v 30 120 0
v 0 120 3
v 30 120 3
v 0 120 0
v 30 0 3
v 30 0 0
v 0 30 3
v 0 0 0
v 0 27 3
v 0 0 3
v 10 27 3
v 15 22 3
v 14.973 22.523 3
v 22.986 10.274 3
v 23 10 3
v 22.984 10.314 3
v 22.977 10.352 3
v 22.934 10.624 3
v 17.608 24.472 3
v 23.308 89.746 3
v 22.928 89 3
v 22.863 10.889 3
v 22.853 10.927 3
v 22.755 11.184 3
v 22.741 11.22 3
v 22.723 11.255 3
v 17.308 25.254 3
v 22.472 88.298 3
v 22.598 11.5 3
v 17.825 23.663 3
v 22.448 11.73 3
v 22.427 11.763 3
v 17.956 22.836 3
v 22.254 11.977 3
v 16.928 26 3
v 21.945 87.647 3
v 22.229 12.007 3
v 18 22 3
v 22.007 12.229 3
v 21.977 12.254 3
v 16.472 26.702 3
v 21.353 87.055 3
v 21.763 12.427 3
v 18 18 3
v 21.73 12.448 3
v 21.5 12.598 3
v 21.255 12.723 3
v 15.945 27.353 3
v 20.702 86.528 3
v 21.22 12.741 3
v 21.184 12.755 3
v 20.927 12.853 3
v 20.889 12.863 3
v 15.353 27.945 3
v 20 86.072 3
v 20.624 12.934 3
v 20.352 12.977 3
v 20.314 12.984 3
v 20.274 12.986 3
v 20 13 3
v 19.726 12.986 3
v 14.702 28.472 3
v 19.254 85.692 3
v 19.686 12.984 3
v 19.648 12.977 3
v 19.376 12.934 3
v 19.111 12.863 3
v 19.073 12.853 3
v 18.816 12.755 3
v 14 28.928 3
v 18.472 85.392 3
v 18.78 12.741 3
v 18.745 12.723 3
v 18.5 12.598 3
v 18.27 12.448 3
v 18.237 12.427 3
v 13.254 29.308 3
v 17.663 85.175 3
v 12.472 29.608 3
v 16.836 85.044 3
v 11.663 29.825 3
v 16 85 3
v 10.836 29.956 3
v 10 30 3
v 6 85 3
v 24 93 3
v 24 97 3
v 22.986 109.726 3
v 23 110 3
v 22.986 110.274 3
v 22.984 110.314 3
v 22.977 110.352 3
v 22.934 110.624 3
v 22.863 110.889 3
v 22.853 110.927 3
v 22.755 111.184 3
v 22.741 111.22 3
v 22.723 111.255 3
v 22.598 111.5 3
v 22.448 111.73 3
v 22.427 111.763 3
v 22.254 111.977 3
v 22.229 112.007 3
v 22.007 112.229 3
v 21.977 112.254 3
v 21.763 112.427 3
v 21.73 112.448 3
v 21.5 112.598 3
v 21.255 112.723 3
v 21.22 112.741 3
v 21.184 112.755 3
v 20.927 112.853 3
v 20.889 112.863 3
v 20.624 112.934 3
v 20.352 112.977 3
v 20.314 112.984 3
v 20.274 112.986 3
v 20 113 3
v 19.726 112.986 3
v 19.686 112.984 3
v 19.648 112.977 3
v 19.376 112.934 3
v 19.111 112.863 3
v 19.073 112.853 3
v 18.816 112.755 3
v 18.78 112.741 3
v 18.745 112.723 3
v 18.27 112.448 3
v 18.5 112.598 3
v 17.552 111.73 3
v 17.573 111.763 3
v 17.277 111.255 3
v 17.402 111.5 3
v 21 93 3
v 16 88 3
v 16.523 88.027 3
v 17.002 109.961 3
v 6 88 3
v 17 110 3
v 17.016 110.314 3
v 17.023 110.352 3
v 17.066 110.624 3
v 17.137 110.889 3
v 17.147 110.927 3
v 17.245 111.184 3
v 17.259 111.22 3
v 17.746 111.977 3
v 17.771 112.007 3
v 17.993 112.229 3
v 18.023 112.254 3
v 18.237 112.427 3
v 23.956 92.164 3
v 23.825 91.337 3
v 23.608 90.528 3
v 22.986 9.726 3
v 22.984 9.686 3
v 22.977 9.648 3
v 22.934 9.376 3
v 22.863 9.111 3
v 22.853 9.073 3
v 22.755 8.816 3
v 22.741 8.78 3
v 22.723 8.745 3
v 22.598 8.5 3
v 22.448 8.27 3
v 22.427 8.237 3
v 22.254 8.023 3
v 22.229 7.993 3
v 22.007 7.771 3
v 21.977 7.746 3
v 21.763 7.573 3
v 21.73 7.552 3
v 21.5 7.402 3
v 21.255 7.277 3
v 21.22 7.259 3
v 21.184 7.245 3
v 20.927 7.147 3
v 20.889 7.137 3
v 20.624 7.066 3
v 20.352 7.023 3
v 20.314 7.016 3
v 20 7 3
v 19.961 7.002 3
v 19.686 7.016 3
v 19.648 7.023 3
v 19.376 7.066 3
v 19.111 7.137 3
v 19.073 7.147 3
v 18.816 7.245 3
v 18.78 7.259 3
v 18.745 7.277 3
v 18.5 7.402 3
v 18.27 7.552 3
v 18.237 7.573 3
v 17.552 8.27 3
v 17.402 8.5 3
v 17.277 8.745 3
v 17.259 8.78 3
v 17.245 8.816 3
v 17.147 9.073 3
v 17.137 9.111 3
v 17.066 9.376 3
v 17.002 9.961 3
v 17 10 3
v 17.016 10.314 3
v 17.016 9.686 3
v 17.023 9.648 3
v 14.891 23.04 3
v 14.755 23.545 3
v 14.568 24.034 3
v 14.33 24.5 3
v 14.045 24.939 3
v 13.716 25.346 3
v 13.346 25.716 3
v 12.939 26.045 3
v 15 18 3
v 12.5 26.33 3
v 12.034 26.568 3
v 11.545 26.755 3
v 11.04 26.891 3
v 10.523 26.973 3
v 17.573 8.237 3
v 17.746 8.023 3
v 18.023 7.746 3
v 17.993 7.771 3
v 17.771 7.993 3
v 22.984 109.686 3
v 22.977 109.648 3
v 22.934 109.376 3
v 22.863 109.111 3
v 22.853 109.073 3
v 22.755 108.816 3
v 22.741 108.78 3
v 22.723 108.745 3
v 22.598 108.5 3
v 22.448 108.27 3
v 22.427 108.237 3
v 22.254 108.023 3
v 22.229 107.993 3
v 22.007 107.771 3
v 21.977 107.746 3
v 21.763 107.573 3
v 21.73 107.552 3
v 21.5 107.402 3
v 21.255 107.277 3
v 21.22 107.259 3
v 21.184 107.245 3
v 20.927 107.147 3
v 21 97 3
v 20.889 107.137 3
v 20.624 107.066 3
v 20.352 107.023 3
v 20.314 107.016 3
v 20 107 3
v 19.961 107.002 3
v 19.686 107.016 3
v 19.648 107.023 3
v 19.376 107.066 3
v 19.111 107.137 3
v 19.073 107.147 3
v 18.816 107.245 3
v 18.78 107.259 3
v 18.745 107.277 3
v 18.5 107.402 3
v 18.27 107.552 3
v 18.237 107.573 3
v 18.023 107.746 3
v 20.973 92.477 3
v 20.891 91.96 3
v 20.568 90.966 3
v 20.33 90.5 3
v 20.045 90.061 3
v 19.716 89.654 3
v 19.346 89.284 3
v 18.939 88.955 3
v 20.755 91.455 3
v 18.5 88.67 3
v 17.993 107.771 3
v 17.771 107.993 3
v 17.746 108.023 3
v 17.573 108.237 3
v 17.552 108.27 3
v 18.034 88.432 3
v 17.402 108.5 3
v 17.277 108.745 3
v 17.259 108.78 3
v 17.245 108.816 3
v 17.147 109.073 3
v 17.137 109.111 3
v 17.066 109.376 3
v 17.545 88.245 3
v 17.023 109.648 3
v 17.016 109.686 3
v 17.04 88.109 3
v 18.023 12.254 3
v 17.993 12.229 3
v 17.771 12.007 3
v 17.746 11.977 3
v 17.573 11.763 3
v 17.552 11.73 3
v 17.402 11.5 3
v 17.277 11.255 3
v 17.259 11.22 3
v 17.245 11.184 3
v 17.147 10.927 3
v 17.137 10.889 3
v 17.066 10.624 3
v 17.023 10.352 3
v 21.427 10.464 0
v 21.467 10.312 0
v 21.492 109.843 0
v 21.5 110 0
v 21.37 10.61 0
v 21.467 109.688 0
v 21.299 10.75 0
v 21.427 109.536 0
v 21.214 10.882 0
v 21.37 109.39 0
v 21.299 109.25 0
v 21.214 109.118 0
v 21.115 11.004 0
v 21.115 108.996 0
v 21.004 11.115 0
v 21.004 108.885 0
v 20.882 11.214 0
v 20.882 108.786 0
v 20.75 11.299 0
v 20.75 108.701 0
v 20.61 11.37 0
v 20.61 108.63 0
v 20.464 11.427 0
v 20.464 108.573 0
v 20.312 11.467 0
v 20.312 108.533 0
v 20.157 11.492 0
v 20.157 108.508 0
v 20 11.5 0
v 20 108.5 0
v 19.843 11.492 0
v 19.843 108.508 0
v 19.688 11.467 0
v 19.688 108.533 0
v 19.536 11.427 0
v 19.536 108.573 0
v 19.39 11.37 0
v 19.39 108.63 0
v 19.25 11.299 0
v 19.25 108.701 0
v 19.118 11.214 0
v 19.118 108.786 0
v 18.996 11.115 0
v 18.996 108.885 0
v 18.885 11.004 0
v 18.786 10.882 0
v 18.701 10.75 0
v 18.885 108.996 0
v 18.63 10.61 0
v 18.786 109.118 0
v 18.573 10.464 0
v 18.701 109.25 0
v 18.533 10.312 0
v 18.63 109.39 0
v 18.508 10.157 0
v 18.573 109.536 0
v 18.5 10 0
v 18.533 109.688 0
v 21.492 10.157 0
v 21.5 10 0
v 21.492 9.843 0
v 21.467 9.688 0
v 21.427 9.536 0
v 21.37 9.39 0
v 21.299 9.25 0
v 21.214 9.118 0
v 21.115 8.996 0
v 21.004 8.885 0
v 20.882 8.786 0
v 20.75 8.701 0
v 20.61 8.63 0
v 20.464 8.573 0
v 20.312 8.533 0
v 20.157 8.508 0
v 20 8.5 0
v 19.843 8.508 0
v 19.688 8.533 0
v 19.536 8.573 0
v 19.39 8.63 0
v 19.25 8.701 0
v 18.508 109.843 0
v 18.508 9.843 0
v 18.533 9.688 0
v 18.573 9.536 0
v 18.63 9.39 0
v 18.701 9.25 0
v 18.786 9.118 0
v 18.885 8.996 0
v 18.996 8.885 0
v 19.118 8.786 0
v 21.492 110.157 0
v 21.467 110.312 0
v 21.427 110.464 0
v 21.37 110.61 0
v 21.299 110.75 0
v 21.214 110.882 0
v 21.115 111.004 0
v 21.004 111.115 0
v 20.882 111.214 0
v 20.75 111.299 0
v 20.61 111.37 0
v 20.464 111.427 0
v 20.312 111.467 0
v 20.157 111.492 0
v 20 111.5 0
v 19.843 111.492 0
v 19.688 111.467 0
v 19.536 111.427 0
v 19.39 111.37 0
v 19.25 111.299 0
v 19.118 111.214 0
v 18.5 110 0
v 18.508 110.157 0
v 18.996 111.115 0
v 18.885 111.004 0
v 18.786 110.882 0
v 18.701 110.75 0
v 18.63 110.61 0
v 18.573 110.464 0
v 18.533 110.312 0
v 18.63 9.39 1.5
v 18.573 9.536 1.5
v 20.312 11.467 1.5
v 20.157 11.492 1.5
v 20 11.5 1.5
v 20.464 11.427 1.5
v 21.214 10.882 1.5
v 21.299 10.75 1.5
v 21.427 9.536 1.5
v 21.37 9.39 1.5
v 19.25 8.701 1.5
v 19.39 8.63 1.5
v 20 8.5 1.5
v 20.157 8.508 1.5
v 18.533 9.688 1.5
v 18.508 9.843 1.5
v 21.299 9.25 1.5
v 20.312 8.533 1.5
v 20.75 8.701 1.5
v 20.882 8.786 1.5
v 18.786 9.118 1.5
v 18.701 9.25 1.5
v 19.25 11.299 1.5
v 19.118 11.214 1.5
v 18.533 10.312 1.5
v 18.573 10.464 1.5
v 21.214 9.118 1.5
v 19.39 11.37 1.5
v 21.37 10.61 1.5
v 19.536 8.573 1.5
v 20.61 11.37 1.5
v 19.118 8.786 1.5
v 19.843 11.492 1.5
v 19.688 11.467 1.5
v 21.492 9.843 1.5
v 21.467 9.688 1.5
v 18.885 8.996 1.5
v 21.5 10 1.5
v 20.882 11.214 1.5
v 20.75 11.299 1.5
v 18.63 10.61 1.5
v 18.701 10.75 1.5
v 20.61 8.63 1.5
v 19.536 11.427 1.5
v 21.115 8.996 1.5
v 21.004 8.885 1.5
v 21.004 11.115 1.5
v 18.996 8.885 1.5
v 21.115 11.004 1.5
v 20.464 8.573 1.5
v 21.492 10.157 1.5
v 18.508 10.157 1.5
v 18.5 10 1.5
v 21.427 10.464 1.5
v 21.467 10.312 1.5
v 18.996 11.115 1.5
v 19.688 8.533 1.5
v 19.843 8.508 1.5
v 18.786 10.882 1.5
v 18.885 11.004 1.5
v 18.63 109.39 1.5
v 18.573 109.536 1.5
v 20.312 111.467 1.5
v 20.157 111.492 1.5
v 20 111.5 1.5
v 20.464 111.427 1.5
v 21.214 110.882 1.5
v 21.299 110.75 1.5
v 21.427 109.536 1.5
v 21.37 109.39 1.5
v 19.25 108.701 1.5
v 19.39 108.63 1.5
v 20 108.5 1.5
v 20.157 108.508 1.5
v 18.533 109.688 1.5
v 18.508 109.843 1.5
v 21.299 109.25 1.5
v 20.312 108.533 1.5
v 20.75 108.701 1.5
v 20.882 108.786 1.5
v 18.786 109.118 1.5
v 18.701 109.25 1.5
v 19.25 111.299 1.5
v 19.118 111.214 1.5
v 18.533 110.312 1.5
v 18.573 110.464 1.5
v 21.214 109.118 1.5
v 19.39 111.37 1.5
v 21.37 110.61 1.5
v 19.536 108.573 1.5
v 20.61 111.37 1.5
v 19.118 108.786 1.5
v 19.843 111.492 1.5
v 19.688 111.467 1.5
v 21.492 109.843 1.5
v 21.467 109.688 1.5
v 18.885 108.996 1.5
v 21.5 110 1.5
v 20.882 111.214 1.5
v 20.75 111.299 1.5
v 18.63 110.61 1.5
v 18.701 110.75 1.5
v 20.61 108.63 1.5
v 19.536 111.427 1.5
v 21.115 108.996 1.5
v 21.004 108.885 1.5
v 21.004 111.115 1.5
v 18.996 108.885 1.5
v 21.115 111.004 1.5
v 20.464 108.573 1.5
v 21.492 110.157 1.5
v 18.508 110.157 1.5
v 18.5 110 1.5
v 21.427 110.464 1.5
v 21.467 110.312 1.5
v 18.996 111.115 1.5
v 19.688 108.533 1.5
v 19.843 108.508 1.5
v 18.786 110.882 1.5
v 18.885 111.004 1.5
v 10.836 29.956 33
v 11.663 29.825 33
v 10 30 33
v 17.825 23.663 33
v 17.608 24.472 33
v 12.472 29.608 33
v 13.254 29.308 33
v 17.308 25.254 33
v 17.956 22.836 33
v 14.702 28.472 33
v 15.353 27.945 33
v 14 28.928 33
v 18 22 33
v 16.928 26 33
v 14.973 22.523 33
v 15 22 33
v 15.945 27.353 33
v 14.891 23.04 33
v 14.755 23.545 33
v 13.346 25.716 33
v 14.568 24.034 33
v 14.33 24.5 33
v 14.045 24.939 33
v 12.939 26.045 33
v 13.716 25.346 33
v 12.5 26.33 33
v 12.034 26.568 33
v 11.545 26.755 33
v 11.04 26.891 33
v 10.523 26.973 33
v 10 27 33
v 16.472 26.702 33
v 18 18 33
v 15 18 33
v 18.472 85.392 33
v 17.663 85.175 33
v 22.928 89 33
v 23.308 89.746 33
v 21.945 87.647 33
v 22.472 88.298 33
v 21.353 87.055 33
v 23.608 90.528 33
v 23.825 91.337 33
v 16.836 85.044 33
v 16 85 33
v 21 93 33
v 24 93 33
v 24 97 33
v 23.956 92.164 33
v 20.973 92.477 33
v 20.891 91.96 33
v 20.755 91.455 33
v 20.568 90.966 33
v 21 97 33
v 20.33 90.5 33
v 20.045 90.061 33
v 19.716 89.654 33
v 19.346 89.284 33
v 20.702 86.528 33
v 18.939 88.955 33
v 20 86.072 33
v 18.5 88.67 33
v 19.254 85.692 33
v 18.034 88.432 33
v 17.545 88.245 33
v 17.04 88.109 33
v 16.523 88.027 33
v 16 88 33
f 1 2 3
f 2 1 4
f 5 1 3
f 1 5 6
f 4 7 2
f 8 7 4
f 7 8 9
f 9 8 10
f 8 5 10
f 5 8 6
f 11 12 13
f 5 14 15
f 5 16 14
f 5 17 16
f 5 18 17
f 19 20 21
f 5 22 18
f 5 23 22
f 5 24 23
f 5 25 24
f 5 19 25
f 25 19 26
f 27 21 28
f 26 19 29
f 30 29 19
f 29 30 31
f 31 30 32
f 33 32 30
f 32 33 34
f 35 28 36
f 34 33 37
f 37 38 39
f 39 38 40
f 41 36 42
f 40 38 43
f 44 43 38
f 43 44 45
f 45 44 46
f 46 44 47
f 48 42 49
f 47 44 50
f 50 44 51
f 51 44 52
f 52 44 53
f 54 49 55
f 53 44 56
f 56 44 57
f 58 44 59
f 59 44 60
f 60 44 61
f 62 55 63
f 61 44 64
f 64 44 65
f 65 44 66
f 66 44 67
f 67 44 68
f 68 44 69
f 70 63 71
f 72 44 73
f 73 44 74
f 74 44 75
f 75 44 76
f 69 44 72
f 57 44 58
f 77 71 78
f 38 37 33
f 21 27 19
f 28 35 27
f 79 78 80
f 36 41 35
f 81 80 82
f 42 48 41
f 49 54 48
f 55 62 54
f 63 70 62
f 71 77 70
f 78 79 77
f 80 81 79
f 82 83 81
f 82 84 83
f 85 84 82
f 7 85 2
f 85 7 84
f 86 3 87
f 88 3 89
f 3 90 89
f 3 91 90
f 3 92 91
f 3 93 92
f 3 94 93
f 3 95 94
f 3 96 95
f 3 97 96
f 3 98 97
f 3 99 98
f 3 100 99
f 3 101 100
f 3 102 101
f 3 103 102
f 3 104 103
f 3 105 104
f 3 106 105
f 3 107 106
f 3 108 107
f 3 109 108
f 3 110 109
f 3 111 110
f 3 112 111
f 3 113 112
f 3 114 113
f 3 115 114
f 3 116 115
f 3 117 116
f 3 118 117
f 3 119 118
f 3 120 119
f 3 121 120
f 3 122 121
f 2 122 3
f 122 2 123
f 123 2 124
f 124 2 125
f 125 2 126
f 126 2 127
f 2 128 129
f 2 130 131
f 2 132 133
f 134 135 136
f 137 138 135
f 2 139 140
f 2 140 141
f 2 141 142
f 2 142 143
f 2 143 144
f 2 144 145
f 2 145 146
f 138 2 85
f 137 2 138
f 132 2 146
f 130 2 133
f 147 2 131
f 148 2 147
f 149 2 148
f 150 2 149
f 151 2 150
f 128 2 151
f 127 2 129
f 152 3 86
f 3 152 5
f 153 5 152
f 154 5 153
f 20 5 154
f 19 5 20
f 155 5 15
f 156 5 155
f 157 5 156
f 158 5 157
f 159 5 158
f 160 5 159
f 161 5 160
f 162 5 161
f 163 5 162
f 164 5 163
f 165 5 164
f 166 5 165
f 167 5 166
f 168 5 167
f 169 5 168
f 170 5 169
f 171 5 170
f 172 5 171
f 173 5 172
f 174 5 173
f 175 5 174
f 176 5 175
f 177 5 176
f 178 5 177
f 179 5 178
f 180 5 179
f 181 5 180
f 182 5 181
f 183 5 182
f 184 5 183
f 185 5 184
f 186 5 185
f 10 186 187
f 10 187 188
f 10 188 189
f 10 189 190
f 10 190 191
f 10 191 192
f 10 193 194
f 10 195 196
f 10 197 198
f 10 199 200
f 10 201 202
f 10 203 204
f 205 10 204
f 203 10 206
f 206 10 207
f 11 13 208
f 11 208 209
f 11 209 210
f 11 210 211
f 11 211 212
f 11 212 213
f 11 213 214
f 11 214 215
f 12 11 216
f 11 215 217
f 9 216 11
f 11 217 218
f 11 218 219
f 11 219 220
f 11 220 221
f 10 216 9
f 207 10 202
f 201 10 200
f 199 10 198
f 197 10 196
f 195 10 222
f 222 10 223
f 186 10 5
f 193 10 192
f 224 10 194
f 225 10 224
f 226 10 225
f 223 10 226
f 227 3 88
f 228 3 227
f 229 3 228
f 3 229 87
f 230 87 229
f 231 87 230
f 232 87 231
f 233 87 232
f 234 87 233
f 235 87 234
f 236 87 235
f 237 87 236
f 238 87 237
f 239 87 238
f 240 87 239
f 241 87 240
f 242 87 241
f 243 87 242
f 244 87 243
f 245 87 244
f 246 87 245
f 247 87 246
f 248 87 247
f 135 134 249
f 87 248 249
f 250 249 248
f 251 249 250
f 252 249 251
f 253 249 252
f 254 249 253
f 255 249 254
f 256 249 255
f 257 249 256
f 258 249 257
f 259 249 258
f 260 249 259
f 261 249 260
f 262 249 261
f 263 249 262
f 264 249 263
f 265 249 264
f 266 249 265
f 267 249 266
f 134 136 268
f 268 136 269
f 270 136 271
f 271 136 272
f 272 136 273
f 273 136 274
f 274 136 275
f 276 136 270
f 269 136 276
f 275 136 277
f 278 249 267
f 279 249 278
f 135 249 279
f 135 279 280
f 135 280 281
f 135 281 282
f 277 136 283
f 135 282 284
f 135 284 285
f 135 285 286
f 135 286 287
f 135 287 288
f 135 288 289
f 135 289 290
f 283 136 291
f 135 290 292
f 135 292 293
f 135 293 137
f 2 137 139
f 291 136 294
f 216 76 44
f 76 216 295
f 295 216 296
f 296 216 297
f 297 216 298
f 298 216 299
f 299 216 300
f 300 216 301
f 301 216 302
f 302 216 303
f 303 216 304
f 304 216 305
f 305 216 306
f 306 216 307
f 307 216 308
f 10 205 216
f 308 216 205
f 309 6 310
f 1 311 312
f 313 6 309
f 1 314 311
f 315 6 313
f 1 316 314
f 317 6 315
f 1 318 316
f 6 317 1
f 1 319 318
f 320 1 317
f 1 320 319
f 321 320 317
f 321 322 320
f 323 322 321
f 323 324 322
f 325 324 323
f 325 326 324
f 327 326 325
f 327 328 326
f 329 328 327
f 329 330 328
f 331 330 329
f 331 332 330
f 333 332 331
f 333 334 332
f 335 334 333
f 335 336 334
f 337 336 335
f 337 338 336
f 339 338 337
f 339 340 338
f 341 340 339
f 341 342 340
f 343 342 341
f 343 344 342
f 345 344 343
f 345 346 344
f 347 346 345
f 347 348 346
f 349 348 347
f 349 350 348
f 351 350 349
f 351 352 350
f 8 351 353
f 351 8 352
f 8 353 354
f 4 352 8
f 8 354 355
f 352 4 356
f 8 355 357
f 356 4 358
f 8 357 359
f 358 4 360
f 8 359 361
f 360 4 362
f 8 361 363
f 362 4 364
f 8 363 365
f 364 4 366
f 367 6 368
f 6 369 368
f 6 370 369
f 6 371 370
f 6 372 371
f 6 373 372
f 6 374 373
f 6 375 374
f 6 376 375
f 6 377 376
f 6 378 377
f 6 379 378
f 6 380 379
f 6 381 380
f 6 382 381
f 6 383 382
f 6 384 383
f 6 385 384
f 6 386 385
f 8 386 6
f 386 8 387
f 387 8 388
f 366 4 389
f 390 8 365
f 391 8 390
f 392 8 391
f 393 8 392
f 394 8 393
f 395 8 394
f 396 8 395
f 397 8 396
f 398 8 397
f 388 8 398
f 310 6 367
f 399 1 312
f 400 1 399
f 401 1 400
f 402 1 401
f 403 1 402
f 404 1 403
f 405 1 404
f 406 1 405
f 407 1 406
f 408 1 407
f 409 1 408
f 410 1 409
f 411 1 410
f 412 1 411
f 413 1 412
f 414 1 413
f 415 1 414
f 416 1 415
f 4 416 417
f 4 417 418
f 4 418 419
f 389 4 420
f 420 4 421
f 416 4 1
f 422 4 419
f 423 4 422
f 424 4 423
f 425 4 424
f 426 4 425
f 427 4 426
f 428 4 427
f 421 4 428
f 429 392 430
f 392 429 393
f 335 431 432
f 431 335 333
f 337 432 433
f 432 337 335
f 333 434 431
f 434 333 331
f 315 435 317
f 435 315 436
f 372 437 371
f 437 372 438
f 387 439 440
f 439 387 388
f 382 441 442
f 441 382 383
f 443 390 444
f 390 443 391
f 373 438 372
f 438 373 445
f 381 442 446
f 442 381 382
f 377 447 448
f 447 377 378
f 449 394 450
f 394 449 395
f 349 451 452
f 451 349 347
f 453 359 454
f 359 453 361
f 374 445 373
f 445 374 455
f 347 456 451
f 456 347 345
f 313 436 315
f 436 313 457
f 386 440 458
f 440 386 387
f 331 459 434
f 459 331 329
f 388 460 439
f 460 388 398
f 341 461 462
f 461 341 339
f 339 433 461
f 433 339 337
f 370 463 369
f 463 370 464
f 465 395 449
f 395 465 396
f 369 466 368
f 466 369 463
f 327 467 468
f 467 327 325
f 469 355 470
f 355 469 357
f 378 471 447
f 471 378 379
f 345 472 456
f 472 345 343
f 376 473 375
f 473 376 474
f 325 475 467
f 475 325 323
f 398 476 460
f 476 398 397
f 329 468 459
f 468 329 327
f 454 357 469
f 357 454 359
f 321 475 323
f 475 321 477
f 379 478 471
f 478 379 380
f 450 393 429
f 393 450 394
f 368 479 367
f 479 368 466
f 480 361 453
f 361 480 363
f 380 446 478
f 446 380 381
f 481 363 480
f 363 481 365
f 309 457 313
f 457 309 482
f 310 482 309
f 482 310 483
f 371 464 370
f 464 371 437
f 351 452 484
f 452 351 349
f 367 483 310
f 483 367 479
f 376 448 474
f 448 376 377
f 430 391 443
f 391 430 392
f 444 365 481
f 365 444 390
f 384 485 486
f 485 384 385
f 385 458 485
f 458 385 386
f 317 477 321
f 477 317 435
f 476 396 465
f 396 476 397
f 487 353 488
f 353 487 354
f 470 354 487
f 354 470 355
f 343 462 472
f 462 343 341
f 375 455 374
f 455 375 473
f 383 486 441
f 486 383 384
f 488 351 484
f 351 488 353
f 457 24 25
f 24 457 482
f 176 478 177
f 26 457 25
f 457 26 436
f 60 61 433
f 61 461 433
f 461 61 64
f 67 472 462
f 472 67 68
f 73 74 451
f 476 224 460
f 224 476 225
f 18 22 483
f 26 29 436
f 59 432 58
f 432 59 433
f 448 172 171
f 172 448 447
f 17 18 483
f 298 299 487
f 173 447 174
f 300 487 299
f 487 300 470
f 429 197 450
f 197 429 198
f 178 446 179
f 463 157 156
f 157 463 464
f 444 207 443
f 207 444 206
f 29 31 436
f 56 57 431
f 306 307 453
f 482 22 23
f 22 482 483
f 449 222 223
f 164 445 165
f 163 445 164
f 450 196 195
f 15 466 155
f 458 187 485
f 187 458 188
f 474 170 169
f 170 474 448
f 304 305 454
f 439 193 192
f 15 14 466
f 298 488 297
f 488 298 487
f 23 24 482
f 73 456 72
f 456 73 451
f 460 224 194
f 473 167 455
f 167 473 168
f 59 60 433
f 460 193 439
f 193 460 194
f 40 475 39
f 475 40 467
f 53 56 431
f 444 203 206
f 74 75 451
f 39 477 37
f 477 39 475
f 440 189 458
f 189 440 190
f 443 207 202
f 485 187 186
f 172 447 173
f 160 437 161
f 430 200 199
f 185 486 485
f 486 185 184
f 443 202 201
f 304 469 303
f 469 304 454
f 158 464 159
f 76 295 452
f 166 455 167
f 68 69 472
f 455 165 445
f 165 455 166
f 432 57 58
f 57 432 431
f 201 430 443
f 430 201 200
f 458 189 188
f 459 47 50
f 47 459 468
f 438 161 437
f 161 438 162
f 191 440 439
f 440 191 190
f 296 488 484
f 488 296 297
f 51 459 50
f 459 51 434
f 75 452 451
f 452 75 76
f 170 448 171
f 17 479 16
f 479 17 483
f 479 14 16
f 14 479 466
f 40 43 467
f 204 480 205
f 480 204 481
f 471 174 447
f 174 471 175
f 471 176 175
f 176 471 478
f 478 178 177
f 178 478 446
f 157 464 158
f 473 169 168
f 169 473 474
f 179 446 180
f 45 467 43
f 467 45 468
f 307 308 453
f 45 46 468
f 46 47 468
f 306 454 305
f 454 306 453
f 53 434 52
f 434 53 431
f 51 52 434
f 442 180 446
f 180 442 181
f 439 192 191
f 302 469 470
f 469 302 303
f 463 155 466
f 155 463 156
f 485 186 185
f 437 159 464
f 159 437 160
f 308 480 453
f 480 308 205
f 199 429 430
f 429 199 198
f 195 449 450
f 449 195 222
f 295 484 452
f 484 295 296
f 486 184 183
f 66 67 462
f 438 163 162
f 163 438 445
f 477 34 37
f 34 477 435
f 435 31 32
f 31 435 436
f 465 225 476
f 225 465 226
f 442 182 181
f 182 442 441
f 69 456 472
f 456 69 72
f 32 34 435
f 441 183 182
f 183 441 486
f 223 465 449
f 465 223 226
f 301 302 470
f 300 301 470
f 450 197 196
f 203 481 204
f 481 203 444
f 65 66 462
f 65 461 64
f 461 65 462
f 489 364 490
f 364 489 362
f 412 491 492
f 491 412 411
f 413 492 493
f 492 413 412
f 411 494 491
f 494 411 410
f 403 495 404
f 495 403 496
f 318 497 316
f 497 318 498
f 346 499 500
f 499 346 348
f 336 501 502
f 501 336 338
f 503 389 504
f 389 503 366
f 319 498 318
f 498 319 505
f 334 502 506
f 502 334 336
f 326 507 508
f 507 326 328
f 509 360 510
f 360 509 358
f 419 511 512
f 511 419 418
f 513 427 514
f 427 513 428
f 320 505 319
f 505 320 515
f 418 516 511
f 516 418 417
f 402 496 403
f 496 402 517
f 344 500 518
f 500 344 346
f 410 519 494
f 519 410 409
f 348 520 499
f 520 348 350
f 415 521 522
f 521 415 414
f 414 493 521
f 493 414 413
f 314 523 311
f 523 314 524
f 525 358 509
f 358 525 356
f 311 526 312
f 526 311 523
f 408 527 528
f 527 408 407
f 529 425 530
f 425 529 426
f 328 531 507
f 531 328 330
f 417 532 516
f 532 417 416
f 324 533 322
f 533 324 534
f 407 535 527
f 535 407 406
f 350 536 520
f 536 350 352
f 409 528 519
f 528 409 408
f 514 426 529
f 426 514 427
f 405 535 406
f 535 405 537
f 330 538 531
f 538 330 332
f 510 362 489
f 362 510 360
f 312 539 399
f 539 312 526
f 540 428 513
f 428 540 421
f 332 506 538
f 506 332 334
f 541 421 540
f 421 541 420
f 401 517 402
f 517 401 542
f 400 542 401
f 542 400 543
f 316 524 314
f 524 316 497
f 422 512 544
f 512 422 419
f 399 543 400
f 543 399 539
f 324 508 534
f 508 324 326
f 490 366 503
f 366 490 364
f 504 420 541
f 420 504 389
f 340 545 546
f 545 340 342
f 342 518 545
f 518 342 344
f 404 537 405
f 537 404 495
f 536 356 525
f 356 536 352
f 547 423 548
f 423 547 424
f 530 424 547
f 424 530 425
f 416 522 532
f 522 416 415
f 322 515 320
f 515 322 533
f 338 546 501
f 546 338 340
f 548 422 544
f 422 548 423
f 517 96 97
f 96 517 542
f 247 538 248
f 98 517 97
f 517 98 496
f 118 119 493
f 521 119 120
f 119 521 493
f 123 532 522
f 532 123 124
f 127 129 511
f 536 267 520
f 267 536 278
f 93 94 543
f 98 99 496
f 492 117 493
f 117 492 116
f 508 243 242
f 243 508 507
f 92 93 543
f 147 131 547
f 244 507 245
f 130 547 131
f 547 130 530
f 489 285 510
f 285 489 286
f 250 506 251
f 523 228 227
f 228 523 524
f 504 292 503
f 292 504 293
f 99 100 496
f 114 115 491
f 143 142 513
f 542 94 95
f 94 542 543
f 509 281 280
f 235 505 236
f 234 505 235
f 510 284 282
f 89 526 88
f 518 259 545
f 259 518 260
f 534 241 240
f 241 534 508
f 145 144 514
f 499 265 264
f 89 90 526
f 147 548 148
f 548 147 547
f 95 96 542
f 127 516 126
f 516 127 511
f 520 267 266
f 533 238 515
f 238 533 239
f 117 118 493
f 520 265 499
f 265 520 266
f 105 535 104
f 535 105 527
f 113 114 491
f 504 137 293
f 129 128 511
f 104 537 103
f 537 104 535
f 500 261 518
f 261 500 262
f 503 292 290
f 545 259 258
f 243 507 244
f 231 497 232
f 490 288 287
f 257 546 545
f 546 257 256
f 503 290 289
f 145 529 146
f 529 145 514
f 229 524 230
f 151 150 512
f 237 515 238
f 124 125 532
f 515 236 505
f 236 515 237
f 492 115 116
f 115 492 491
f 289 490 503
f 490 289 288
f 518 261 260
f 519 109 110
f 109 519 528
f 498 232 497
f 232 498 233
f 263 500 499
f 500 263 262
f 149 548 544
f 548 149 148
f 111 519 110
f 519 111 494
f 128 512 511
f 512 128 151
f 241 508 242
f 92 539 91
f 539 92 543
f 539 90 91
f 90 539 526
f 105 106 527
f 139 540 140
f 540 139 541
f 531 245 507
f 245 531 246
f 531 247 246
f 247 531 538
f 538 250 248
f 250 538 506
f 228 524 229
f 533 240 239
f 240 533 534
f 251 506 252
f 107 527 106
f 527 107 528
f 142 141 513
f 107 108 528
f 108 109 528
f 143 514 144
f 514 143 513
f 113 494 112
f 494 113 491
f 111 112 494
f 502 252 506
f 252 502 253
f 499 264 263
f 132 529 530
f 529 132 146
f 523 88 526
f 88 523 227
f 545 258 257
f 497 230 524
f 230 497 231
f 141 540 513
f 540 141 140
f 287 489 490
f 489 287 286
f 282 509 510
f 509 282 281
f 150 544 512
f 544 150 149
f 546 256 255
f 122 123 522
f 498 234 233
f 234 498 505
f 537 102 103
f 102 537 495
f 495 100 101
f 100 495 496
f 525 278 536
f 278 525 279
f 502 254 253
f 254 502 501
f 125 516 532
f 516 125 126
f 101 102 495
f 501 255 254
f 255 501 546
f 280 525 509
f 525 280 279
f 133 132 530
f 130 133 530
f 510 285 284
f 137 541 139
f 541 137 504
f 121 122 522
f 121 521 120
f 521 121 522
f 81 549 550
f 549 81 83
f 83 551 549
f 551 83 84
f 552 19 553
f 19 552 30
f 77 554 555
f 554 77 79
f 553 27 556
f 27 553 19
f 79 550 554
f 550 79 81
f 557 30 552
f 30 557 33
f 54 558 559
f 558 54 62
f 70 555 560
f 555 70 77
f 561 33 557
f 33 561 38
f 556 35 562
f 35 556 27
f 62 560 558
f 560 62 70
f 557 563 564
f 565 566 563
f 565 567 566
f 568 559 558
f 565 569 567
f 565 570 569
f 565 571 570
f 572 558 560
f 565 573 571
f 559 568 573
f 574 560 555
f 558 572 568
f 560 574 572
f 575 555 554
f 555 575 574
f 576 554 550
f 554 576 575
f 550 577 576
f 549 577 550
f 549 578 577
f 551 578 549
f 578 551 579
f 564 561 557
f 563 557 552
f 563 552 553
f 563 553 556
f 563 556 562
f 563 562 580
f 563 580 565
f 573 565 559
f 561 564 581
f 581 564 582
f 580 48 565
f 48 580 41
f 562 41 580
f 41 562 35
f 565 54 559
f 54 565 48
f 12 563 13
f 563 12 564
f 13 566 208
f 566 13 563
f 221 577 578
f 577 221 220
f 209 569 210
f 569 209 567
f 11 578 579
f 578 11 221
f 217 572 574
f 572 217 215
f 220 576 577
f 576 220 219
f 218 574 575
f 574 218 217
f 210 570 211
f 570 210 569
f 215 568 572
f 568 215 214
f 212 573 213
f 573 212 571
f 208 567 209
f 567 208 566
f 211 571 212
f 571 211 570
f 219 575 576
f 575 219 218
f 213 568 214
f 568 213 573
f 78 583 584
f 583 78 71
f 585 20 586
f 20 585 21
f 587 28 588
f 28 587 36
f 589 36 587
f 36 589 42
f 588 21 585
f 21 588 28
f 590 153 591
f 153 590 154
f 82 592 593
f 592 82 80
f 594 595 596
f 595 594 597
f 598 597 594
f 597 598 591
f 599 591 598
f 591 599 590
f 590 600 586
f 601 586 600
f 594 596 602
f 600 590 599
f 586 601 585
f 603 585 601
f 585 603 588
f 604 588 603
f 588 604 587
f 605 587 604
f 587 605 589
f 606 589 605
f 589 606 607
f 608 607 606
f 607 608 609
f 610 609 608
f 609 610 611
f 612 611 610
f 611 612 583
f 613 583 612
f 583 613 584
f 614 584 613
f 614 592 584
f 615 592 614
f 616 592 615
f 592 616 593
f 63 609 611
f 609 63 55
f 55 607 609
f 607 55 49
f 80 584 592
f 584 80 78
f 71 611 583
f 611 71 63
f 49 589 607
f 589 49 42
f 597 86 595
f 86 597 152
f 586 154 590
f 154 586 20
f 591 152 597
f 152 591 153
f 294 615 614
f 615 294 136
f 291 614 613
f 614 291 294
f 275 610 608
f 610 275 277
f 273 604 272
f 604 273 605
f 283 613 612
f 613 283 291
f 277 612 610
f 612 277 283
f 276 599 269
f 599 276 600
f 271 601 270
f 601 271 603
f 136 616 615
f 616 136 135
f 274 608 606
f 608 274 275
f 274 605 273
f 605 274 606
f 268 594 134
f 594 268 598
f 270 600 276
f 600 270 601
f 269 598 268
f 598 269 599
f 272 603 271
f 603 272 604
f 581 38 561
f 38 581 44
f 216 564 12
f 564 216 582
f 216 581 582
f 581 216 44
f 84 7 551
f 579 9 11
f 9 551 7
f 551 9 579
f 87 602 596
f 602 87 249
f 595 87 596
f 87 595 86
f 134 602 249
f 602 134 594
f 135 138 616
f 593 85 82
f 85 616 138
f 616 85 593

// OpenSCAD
$fn = 60;

rotate([90, 0, 90]) {
 difference () {
   cube([120, 3, 30]);
   translate([10, 4, 20]) rotate([90, 0, 0]) cylinder(5, r=1.5);
   translate([10, 1.5, 20]) rotate([-90, 0, 0]) cylinder(2, r1=1.5, r2=3.5);
   translate([110, 4, 20]) rotate([90, 0, 0]) cylinder(5, r=1.5);
   translate([110, 1.5, 20]) rotate([-90, 0, 0]) cylinder(2, r1=1.5, r2=3.5);
 

 
   }
 
  translate([22, 3, 10]) rotate([-90, 0, 0]) difference () { cylinder(30, r=8); 
    cylinder(31, r=5); 
    translate([-9, -9, 0]) cube([9, 18, 31]);
    translate([0, 0, 0]) cube([9, 9, 31]);

    }
  translate([18, 3, 15]) cube([4, 30, 3]);
translate([30, 3, 0]) rotate([0, -90, 0]) {
linear_extrude(height=3) {
polygon([[0, 0], [10, 0], [10, 30]]);
}
}


  translate([93, 3, 16]) rotate([-90, 0, 0]) difference () {
    cylinder(30, r=8); 
    cylinder(31, r=5);
    translate([0, -9, 0]) cube([9, 18, 31]);
    translate([-9, 0, 0]) cube([9, 9, 31]);
  }
   
  translate([93, 3, 21]) cube([4, 30, 3]);

translate([88, 3, 6]) rotate([0, -90, 0]) {
linear_extrude(height=3) {
polygon([[0, 0], [10, 0], [10, 30]]);
}
}



}
